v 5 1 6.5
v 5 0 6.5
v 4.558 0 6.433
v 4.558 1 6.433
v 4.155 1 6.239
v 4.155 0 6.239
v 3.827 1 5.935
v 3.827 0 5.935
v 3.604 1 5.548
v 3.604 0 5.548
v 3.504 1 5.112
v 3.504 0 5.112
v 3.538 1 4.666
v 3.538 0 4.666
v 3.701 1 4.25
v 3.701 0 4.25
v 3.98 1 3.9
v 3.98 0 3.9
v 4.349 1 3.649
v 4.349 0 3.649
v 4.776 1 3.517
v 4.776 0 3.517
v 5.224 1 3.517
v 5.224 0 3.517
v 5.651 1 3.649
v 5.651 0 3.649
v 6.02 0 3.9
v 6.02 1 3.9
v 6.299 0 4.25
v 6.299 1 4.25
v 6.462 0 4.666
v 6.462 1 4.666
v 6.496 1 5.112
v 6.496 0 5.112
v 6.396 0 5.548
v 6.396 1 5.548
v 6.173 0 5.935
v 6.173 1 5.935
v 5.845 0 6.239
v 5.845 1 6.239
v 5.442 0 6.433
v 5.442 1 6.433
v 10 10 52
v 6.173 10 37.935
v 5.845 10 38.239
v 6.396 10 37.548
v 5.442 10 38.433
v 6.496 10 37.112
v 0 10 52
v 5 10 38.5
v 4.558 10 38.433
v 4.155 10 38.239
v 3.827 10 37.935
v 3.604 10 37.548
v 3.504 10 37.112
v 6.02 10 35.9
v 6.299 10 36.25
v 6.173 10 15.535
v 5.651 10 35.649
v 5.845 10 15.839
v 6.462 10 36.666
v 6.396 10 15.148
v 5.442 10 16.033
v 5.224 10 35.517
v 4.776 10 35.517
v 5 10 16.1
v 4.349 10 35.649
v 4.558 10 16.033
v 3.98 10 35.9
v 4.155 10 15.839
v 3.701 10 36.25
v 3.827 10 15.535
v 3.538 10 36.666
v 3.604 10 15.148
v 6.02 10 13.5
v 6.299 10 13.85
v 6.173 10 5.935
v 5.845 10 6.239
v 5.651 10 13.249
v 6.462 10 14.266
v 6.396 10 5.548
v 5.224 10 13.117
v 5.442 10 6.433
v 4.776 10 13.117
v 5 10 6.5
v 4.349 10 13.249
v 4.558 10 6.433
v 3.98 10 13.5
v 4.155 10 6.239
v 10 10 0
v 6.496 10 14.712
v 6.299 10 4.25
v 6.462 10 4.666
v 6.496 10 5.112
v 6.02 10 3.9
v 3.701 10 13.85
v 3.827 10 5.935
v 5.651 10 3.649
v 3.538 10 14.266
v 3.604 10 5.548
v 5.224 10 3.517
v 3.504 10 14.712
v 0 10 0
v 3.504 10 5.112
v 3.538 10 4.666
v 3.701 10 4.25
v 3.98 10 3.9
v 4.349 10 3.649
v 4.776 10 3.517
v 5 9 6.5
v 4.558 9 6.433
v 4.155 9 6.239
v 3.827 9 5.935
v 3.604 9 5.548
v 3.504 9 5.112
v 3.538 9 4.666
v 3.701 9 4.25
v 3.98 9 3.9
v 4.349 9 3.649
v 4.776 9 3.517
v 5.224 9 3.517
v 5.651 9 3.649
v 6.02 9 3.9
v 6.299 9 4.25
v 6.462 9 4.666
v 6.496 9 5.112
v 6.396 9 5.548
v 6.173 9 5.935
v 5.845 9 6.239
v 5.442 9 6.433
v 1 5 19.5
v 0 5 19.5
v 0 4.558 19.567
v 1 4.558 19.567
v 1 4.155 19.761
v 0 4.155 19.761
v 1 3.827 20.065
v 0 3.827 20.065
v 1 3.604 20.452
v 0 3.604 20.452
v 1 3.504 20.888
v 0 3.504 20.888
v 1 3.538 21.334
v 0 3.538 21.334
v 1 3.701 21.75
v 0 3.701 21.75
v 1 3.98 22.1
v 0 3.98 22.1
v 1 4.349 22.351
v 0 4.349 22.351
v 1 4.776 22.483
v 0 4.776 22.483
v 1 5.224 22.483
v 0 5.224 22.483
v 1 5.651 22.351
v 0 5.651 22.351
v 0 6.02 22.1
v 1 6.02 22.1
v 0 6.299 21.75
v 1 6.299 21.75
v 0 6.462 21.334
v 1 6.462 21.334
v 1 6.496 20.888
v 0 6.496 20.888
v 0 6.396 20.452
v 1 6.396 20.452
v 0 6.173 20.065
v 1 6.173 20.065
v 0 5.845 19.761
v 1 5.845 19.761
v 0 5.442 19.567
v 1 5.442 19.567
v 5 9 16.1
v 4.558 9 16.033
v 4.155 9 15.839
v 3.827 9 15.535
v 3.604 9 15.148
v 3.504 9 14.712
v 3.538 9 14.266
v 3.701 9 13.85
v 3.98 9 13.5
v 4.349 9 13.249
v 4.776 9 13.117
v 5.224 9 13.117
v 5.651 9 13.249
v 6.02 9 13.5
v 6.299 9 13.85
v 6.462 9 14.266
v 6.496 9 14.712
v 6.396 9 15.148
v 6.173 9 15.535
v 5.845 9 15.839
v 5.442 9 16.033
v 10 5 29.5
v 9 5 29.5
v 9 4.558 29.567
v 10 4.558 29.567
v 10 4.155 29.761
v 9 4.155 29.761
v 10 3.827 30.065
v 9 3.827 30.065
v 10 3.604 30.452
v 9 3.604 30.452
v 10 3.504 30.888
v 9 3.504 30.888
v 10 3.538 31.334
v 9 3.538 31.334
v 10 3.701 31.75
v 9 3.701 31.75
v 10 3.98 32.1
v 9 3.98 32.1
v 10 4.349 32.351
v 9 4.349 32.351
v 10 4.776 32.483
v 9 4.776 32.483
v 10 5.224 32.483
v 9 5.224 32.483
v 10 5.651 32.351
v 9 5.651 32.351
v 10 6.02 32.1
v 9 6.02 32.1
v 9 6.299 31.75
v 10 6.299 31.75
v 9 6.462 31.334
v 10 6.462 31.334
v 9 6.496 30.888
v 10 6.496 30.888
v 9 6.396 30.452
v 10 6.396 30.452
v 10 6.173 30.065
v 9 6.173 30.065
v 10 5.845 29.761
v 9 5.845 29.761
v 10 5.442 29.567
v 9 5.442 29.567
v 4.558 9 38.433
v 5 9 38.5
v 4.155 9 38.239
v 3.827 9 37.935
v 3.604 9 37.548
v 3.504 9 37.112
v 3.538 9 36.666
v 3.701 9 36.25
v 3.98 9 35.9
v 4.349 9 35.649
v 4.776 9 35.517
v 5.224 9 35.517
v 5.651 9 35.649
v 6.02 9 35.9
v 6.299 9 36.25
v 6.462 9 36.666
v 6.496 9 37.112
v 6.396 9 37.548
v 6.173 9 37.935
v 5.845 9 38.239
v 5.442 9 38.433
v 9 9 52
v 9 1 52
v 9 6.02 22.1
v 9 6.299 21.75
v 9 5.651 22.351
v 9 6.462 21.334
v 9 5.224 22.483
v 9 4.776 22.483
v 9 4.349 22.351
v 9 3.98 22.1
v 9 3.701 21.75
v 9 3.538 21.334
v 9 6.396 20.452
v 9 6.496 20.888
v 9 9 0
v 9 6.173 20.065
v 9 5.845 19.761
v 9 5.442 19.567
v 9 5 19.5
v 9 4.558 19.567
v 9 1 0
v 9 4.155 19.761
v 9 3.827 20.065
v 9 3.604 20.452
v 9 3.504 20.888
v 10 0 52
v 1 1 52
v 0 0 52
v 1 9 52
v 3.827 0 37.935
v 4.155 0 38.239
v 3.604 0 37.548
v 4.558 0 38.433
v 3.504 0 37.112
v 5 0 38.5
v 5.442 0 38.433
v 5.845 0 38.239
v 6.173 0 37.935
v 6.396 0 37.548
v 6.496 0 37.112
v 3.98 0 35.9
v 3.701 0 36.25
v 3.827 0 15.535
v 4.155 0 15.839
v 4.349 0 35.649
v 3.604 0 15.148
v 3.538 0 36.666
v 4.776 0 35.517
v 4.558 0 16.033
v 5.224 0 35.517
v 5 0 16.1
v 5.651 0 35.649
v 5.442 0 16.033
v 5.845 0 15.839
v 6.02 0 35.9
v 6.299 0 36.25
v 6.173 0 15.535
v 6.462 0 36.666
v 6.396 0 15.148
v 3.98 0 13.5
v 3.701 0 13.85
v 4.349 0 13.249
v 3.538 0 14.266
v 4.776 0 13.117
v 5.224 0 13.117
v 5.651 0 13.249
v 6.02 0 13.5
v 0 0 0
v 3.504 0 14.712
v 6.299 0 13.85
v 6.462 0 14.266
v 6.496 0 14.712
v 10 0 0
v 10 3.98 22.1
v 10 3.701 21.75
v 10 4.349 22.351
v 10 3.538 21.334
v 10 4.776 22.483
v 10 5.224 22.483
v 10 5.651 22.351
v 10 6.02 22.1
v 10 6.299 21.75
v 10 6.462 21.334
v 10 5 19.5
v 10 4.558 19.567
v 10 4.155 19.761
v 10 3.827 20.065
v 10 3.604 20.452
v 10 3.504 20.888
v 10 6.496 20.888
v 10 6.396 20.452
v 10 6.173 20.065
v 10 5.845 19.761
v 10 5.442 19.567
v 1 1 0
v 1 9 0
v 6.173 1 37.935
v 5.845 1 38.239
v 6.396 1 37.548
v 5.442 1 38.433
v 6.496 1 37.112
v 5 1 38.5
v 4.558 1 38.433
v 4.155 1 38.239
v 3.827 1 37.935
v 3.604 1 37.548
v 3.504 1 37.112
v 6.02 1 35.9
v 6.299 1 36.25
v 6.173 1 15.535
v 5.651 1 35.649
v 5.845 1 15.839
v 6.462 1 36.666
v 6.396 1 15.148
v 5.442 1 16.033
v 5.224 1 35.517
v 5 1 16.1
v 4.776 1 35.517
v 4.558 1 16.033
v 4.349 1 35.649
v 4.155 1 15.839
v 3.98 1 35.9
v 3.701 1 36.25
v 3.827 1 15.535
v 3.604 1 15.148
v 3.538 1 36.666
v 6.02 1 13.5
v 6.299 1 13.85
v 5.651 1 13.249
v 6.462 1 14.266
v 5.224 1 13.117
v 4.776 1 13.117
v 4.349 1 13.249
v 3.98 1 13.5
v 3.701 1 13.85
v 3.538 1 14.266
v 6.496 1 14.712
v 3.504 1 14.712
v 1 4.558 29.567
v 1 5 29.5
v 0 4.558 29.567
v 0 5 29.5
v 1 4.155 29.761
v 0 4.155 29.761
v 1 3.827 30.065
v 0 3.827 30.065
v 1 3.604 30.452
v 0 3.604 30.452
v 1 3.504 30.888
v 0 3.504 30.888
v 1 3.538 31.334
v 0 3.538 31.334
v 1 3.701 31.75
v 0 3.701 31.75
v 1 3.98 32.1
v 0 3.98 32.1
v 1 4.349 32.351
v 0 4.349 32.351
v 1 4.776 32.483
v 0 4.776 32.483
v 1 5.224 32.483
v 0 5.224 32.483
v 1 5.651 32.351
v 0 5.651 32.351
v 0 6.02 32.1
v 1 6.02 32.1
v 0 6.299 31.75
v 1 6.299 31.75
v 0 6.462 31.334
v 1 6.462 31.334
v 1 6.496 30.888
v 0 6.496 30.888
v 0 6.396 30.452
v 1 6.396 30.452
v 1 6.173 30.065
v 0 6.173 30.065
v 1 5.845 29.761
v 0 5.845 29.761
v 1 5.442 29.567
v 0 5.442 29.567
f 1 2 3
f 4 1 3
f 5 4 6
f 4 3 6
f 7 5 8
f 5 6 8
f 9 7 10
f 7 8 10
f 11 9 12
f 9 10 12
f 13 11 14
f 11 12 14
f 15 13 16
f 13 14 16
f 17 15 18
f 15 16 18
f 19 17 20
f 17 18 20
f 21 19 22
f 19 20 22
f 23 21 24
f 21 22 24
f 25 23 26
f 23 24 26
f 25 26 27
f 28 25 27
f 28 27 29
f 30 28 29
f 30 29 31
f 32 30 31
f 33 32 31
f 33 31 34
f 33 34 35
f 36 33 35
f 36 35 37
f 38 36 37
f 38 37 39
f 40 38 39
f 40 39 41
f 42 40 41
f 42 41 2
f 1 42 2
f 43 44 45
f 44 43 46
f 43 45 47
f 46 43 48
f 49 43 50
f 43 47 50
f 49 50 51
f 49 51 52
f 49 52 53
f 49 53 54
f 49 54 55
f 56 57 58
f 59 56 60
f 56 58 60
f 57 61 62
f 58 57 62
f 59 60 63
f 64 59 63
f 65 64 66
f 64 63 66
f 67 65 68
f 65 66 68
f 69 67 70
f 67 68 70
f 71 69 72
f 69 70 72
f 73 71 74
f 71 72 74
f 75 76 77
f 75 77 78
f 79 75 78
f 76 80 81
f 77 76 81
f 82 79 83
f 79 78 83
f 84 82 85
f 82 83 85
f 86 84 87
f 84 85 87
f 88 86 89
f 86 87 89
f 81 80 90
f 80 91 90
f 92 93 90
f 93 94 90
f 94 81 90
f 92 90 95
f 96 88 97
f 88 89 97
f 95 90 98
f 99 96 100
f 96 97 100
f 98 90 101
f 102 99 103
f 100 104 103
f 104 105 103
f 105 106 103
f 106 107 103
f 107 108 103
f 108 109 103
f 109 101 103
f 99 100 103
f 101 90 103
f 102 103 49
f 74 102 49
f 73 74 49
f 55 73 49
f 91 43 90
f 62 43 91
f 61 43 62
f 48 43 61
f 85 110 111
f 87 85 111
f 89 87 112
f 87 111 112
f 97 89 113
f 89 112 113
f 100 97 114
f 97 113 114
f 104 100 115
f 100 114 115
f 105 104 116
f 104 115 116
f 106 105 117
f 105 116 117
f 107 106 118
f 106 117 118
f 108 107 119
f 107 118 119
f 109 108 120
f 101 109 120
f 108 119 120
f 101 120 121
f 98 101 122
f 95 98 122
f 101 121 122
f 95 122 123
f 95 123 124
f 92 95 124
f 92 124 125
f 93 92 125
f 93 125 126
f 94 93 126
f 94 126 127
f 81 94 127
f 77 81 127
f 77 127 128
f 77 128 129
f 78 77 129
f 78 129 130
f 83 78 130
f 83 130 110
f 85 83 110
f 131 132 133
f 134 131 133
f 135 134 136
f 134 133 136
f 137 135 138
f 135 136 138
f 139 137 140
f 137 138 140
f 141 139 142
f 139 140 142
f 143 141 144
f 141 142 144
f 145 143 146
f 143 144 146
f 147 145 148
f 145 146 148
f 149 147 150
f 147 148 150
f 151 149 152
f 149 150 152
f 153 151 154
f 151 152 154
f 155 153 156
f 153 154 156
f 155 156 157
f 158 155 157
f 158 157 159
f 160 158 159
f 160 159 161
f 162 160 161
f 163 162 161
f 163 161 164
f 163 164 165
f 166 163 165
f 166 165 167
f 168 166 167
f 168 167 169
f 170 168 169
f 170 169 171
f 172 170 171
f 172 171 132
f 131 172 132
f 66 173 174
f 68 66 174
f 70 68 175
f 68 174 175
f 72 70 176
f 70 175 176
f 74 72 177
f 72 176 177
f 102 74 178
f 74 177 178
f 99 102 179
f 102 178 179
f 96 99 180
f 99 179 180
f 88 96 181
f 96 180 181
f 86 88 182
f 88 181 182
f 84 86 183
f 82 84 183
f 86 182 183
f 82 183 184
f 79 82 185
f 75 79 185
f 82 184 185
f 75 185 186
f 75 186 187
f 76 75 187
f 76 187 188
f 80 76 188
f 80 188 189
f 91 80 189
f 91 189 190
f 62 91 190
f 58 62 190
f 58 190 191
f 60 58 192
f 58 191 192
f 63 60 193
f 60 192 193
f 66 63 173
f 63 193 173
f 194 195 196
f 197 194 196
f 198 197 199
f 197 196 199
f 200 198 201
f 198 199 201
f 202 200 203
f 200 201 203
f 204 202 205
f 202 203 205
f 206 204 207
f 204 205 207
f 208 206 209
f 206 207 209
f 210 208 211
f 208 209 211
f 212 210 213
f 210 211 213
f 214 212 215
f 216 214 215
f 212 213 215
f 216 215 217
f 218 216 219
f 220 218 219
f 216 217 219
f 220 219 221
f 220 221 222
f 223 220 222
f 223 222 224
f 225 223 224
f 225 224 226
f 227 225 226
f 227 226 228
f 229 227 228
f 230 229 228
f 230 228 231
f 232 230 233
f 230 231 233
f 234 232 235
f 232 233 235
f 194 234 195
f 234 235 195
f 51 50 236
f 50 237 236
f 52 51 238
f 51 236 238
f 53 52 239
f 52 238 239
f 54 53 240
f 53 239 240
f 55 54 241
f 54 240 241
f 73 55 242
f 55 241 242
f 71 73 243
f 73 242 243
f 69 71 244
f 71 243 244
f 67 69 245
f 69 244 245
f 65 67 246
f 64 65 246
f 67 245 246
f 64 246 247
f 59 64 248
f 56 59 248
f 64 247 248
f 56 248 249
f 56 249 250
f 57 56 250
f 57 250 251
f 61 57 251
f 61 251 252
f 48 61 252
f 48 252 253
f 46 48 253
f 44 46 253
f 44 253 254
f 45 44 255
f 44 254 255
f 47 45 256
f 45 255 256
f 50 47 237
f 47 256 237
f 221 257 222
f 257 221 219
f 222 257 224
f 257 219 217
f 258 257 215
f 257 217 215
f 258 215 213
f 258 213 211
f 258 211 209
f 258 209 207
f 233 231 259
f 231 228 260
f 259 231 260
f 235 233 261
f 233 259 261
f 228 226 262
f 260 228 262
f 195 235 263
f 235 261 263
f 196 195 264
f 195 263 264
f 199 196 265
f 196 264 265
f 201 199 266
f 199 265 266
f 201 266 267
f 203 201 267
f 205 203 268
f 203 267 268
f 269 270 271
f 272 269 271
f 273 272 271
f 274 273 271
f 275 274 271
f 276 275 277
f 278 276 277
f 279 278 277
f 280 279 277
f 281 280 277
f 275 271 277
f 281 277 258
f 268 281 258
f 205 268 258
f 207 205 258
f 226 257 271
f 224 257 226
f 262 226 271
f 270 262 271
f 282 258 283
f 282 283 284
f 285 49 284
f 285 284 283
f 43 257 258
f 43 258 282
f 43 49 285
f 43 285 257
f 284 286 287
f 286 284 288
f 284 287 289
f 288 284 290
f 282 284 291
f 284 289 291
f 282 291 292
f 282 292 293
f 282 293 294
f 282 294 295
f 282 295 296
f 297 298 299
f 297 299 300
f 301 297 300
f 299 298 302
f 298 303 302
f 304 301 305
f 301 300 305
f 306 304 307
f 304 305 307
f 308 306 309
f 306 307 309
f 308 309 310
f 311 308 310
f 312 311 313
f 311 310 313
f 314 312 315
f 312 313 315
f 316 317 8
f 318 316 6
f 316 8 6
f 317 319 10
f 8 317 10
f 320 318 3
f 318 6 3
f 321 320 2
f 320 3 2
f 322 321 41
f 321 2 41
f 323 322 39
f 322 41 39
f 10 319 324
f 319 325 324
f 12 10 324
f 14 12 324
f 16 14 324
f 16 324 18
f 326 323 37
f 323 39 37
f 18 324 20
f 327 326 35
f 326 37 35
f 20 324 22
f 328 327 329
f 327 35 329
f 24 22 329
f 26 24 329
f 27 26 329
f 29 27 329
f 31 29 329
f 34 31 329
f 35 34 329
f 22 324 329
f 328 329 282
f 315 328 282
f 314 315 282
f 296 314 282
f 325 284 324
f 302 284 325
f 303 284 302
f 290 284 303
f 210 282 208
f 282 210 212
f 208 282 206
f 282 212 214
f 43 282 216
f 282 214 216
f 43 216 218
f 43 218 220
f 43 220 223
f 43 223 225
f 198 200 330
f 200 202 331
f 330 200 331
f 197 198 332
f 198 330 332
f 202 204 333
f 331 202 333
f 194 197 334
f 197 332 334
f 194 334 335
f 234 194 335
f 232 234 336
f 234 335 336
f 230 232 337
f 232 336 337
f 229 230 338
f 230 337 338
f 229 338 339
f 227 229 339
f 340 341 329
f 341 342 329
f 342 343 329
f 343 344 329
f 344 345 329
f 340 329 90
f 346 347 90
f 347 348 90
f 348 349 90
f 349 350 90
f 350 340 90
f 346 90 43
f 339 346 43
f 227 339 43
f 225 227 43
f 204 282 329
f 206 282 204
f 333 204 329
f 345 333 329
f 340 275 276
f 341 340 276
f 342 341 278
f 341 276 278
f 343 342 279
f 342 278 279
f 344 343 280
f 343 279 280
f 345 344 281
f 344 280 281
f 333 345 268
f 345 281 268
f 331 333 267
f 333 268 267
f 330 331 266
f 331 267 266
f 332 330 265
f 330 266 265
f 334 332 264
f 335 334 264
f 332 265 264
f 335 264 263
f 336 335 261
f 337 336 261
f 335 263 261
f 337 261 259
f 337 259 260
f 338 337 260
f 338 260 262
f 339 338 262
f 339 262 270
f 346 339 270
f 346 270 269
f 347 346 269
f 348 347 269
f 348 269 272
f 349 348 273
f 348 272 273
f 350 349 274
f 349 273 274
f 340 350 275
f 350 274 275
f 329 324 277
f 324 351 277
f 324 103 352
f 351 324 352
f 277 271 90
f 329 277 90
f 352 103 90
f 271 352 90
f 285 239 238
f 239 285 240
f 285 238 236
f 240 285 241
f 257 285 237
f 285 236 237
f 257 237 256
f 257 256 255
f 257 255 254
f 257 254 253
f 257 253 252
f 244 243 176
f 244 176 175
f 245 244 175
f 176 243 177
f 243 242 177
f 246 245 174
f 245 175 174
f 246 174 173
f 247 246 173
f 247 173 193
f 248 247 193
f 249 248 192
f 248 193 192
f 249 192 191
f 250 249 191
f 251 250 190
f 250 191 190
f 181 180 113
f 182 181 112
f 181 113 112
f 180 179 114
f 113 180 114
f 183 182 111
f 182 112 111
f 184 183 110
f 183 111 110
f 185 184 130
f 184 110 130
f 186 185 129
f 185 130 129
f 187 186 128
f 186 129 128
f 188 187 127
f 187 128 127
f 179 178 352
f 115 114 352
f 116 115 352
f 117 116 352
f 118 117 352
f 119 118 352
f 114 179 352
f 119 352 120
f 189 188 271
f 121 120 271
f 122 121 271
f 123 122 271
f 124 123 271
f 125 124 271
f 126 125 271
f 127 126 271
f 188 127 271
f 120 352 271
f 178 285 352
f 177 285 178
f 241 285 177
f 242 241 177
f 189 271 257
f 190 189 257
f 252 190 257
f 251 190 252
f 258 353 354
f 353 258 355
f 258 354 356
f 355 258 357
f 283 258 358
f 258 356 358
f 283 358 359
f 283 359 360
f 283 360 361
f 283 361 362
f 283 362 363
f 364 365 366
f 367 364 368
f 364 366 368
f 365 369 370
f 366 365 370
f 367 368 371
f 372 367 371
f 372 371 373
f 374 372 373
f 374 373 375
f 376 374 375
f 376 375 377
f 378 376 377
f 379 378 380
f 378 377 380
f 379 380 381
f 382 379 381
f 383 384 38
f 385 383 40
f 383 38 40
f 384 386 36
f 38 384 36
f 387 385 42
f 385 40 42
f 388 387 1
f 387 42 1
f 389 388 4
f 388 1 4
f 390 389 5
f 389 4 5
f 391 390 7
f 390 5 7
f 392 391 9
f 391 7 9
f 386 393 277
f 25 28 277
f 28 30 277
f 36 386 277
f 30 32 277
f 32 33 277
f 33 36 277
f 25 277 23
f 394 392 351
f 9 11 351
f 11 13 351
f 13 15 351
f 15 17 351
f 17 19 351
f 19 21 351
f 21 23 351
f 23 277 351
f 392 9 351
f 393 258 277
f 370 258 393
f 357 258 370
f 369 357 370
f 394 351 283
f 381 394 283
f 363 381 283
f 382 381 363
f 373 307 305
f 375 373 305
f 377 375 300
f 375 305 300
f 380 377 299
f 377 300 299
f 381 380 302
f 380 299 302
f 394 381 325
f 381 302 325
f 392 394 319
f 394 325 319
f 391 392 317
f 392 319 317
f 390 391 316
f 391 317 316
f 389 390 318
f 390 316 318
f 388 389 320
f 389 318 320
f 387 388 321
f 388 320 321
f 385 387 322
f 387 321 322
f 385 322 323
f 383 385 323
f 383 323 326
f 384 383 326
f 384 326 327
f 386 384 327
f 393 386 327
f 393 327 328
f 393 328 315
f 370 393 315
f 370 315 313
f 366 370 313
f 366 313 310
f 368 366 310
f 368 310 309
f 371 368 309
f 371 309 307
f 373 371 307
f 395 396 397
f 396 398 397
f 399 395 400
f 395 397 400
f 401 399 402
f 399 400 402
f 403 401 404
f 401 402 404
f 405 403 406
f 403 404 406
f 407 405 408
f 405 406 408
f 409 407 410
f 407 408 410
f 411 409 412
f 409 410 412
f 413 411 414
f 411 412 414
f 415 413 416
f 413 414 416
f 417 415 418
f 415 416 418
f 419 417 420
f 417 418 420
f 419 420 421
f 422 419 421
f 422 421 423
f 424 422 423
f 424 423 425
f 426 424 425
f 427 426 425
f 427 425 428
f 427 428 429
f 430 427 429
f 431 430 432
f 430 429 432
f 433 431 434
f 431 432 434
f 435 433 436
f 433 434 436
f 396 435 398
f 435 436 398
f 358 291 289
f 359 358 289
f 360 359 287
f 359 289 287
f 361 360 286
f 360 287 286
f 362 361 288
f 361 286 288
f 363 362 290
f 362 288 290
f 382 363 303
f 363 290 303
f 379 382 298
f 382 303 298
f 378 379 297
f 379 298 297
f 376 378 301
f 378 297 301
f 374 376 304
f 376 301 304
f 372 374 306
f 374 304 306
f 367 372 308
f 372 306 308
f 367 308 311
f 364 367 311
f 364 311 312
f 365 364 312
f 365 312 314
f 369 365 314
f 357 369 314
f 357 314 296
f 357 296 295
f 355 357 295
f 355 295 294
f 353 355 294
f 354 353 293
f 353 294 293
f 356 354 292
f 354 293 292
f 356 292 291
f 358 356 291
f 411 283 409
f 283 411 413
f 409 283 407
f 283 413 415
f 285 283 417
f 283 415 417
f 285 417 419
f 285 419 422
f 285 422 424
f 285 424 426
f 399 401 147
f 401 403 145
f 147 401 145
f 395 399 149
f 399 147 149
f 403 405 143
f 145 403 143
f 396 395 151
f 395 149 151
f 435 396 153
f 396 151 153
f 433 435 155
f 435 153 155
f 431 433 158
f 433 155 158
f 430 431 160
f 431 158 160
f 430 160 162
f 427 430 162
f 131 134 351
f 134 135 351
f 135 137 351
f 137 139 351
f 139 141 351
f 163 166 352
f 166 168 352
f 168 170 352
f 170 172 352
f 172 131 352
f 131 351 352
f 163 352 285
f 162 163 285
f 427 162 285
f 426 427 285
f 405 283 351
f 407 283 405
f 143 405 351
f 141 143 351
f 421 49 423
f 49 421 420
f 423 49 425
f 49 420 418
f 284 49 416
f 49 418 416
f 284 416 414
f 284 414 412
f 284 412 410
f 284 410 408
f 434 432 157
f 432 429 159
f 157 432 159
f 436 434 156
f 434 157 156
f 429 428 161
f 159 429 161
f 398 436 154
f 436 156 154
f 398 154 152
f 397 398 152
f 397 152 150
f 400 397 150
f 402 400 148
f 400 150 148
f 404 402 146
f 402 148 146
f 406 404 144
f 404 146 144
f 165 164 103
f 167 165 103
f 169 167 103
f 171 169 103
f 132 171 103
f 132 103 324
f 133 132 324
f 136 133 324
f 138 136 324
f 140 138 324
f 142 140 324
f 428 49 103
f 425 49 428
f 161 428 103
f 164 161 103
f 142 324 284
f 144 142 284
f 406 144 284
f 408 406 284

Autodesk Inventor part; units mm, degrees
ref_plane "YZ Plane" through (0, 0, 0) normal (1, 0, 0) x (0, 1, 0)
ref_plane "XZ Plane" through (0, 0, 0) normal (0, 1, 0) x (-1, 0, 0)
ref_plane "XY Plane" through (0, 0, 0) normal (0, 0, 1) x (1, 0, 0)
sketch "スケッチ1" plane through (0, 0, 0) normal (0, 0, 1) x (1, 0, 0)
  line L0 (0, 0) -> (10, 0)
  line L1 (10, 0) -> (10, 10)
  line L2 (10, 10) -> (0, 10)
  line L3 (0, 10) -> (0, 0)
  line L4 (1, 9) -> (9, 9)
  line L5 (9, 9) -> (9, 1)
  line L6 (9, 1) -> (1, 1)
  line L7 (1, 1) -> (1, 9)
  dimension "d0" = 10
  dimension "d1" = 10
  dimension "d2" = 1
extrude "押し出し1" add sketch "スケッチ1" along normal blind 52
sketch "スケッチ2" plane through (0, 10, 0) normal (0, 1, 0) x (1, 0, 0)
  line L0 (10, -52) -> (0, -52) projected
  line L1 (10, 0) -> (10, -52) projected
  line L2 (10, -26) -> (0, -26)
  line L3 (0, 0) -> (0, -52) projected
  point P0 (5, -37)
  point P1 (5, -14.6)
  point P2 (5, -5)
  dimension "d5" = 22.4
  dimension "d7" = 5
  dimension "d8" = 5
  dimension "d35" = 9.6
  dimension "d36" = 11
hole "穴1" at (5, 10, 37) at (5, 10, 14.6) at (5, 10, 5) direction (0, -1, 0) diameter 3 end through all
sketch "スケッチ3" plane through (10, 0, 0) normal (1, 0, 0) x (0, 0, -1)
  line L0 (0, 0) -> (-52, 0) projected
  line L1 (-52, 0) -> (-52, 10) projected
  line L2 (0, 0) -> (-52, 0) projected
  line L3 (-26, 0) -> (-26, 10)
  line L4 (0, 10) -> (-52, 10) projected
  point P0 (-31, 5)
  point P1 (-21, 5)
  dimension "d32" = 5
  dimension "d33" = 5
hole "穴2" at (10, 5, 31) at (10, 5, 21) direction (-1, 0, 0) diameter 3 end through all
sketch "スケッチ4" plane through (0, 10, 0) normal (0, 1, 0) x (1, 0, 0)
  line L0 (4.6245, -45.4744) -> (6.8253, -45.4744) construction
  line L1 (6.8253, -45.4744) -> (6.8253, -52.8345) construction
  line L2 (6.8253, -52.8345) -> (4.6245, -52.8345) construction
  line L3 (4.6245, -52.8345) -> (4.6245, -45.4744) construction
  point P0 (0, 0)
equation "\"d8\" = d7"
properties part number "finger_k_mk_2" material "アルミニウム 6061-AHC"
